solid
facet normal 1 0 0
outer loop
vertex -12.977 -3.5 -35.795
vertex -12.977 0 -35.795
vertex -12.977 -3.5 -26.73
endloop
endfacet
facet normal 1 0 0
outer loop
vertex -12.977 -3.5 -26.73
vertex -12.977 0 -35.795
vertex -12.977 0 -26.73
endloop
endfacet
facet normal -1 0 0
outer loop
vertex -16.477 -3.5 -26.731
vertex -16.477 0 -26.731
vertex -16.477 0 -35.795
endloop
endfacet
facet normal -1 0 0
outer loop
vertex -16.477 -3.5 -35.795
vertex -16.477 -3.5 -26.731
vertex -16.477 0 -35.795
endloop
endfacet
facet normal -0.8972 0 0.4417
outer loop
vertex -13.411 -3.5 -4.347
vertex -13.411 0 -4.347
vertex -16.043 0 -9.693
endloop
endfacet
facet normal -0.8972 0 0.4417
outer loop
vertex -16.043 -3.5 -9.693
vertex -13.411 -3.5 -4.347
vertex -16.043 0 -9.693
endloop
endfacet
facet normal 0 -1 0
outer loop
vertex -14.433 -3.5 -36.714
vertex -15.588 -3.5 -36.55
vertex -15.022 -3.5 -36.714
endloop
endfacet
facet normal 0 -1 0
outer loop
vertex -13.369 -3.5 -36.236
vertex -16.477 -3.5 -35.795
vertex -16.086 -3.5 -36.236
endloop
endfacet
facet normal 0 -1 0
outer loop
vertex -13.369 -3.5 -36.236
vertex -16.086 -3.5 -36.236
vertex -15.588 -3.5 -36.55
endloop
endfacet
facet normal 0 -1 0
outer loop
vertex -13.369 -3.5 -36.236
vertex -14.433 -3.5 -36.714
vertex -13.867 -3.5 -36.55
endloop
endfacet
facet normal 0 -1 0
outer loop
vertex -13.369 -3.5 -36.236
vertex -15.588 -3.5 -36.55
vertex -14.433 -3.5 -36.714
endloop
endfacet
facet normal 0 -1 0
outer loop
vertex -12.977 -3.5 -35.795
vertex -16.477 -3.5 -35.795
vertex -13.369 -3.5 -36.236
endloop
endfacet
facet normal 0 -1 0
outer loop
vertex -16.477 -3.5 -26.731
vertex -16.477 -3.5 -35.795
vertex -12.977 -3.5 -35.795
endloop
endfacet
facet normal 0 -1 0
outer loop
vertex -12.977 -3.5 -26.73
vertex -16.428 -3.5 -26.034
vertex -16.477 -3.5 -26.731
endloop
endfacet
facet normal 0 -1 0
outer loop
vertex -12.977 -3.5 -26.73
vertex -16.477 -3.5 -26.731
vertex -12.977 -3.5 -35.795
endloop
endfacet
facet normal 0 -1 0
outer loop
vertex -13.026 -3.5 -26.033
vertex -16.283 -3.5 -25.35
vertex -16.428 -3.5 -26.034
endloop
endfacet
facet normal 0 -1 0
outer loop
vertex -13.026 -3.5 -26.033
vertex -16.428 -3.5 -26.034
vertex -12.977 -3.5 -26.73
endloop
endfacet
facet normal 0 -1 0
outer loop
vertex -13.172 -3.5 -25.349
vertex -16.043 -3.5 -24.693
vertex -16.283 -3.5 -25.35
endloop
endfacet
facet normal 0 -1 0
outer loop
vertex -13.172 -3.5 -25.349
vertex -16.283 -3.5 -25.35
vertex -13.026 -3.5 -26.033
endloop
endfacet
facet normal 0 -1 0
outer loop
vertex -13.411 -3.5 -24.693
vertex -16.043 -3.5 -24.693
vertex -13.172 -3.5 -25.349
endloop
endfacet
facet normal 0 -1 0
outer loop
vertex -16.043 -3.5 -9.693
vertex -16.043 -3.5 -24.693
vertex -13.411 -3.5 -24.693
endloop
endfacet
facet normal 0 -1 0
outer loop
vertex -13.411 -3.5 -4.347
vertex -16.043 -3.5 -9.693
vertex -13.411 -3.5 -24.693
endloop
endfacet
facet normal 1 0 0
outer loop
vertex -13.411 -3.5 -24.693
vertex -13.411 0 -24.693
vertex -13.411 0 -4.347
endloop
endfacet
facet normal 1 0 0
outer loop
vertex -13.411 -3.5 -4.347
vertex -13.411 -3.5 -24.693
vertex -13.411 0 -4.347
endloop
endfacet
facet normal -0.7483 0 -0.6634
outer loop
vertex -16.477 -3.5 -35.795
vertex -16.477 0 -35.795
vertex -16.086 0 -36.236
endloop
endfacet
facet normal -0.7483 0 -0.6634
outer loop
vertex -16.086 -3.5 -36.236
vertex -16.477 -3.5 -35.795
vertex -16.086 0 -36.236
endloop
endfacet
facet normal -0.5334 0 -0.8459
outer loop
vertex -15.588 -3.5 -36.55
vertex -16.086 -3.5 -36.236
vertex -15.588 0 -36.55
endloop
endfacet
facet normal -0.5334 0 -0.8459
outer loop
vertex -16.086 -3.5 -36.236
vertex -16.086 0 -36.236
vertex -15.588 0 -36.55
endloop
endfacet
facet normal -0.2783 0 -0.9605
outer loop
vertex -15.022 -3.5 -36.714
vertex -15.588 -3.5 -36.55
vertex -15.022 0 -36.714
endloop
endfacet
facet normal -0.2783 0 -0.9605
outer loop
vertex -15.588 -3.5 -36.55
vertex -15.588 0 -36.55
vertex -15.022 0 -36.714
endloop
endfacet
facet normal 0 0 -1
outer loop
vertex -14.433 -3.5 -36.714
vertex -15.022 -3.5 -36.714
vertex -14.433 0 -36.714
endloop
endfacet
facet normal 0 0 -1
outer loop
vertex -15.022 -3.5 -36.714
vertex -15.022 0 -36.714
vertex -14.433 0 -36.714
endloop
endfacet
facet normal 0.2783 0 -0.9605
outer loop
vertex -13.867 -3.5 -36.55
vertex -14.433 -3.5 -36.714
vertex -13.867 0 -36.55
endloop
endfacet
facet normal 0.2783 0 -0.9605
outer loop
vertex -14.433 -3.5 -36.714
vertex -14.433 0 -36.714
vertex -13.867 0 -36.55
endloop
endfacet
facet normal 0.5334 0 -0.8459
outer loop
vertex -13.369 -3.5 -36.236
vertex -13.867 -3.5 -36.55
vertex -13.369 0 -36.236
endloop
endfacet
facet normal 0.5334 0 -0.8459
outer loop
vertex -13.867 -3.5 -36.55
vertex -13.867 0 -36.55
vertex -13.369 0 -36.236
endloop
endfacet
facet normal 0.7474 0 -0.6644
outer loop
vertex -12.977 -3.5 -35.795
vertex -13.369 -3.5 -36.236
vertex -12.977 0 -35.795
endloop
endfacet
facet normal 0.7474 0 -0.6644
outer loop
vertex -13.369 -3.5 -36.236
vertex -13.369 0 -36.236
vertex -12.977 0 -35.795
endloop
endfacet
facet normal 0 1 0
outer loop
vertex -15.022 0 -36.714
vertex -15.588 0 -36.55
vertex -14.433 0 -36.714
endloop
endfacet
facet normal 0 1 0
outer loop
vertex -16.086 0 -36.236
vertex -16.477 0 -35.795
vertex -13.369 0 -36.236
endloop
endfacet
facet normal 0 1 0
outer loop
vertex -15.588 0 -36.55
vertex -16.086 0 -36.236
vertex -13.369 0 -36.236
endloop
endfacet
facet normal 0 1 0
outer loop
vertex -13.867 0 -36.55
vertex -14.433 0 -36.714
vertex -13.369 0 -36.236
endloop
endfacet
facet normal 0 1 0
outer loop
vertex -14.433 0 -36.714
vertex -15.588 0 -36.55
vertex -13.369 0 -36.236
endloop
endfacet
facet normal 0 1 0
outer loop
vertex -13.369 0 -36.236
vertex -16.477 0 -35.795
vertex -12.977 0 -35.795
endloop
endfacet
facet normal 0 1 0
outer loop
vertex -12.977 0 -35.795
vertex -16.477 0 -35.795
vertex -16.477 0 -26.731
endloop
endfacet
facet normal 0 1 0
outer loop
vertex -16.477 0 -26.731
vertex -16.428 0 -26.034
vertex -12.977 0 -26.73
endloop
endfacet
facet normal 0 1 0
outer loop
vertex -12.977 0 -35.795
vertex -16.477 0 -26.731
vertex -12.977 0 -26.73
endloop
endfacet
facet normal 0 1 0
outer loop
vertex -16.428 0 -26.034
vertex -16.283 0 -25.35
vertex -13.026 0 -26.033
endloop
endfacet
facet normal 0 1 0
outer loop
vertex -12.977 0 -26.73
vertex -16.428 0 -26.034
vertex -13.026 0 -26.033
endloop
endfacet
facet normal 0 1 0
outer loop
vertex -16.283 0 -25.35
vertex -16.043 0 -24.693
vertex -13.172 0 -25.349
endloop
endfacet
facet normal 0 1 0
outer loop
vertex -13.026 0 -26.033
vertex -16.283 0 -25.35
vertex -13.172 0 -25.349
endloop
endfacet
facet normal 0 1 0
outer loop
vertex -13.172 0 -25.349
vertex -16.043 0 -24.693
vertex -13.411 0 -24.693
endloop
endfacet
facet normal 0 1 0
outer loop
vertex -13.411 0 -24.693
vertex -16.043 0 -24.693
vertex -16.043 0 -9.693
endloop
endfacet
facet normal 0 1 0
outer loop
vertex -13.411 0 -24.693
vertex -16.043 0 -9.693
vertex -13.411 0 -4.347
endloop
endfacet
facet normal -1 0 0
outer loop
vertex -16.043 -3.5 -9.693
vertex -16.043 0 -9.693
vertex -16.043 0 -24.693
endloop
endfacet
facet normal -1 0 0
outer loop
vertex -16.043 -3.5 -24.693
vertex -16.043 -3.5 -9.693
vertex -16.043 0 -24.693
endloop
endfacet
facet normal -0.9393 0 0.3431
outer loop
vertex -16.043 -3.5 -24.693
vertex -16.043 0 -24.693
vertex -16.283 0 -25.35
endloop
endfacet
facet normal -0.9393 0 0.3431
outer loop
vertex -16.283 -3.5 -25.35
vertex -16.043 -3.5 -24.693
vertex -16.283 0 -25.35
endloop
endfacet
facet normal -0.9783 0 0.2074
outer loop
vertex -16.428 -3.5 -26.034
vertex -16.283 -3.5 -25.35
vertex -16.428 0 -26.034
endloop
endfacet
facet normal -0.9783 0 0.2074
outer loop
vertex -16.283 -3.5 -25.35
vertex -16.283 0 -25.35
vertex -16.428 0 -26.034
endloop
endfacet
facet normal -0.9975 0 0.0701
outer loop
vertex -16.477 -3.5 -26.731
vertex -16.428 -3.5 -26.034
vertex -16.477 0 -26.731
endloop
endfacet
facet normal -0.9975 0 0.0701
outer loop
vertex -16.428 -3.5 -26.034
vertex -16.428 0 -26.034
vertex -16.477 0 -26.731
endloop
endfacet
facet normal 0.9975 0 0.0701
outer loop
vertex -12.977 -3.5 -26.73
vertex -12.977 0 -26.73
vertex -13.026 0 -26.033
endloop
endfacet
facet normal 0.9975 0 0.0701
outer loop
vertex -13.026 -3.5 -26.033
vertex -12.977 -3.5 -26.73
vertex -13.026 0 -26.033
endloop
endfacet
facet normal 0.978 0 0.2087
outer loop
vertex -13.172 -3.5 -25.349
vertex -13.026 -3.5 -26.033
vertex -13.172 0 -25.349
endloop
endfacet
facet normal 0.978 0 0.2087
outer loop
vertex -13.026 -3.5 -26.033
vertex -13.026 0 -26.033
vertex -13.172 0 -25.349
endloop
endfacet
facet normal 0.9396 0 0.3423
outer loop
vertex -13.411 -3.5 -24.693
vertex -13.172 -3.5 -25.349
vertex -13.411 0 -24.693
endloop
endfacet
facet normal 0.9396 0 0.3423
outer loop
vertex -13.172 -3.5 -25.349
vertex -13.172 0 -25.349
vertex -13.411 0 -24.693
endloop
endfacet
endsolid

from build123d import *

# Parameters (mm, degrees)
F1_DEPTH    = 3.5
F2_T1_DEPTH = 13.6927447268
F2_T3_DEPTH = 13.6880389421


# Not quite as in the source:
# - a fillet or chamfer that OpenCascade refuses, or shapes differently, is made with other operations: its cross-section is extruded or revolved along the edge and cut away or added


with BuildPart() as f1:
    # F0 (on Front) → F1 (new body)
    with BuildSketch(Plane.XZ):
        with BuildLine():
            Line((-12.9772726037, -35.7954576612), (-16.4772726037, -35.7954576612))
            ThreePointArc((-16.4772726037, -35.7954576612), (-14.7272726037, -36.734376134), (-12.9772726037, -35.7954576612))
        make_face()
        Polygon((-16.0428304225, -9.6928073466), (-16.0428304225, -24.6928073466), (-13.4112946689, -24.6928073466), (-13.4112946689, -4.3468838558), align=None)
        Polygon((-16.4772726037, -24.6928073466), (-16.4772726037, -35.7954576612), (-12.9772726037, -35.7954576612), (-12.9772726037, -24.6928073466), (-13.4112946689, -24.6928073466), (-16.0428304225, -24.6928073466), align=None)
    extrude(amount=F1_DEPTH)

    # F2: fillet of radius 5 on 2 edges, made by hand

    # F2_s2 → F2_t1 (cut)
    with BuildSketch(Plane.XZ.offset(-5.0963723634)):
        with BuildLine():
            ThreePointArc((-16.0428304225, -24.6928073466), (-16.3674560917, -25.6891924599), (-16.4772726037, -26.7313562919))
            Line((-16.4772726037, -26.7313562919), (-16.4772726037, -24.6928073466))
            Line((-16.4772726037, -24.6928073466), (-16.0428304225, -24.6928073466))
        make_face()
    extrude(amount=F2_T1_DEPTH, mode=Mode.SUBTRACT)

    # F2_s4 → F2_t3 (cut)
    with BuildSketch(Plane.XZ.offset(-5.094019471)):
        with BuildLine():
            ThreePointArc((-12.9772726037, -26.730415135), (-13.0869817292, -25.6887553234), (-13.4112946689, -24.6928073466))
            Line((-13.4112946689, -24.6928073466), (-12.9772726037, -24.6928073466))
            Line((-12.9772726037, -24.6928073466), (-12.9772726037, -26.730415135))
        make_face()
    extrude(amount=F2_T3_DEPTH, mode=Mode.SUBTRACT)


solid = f1.part
